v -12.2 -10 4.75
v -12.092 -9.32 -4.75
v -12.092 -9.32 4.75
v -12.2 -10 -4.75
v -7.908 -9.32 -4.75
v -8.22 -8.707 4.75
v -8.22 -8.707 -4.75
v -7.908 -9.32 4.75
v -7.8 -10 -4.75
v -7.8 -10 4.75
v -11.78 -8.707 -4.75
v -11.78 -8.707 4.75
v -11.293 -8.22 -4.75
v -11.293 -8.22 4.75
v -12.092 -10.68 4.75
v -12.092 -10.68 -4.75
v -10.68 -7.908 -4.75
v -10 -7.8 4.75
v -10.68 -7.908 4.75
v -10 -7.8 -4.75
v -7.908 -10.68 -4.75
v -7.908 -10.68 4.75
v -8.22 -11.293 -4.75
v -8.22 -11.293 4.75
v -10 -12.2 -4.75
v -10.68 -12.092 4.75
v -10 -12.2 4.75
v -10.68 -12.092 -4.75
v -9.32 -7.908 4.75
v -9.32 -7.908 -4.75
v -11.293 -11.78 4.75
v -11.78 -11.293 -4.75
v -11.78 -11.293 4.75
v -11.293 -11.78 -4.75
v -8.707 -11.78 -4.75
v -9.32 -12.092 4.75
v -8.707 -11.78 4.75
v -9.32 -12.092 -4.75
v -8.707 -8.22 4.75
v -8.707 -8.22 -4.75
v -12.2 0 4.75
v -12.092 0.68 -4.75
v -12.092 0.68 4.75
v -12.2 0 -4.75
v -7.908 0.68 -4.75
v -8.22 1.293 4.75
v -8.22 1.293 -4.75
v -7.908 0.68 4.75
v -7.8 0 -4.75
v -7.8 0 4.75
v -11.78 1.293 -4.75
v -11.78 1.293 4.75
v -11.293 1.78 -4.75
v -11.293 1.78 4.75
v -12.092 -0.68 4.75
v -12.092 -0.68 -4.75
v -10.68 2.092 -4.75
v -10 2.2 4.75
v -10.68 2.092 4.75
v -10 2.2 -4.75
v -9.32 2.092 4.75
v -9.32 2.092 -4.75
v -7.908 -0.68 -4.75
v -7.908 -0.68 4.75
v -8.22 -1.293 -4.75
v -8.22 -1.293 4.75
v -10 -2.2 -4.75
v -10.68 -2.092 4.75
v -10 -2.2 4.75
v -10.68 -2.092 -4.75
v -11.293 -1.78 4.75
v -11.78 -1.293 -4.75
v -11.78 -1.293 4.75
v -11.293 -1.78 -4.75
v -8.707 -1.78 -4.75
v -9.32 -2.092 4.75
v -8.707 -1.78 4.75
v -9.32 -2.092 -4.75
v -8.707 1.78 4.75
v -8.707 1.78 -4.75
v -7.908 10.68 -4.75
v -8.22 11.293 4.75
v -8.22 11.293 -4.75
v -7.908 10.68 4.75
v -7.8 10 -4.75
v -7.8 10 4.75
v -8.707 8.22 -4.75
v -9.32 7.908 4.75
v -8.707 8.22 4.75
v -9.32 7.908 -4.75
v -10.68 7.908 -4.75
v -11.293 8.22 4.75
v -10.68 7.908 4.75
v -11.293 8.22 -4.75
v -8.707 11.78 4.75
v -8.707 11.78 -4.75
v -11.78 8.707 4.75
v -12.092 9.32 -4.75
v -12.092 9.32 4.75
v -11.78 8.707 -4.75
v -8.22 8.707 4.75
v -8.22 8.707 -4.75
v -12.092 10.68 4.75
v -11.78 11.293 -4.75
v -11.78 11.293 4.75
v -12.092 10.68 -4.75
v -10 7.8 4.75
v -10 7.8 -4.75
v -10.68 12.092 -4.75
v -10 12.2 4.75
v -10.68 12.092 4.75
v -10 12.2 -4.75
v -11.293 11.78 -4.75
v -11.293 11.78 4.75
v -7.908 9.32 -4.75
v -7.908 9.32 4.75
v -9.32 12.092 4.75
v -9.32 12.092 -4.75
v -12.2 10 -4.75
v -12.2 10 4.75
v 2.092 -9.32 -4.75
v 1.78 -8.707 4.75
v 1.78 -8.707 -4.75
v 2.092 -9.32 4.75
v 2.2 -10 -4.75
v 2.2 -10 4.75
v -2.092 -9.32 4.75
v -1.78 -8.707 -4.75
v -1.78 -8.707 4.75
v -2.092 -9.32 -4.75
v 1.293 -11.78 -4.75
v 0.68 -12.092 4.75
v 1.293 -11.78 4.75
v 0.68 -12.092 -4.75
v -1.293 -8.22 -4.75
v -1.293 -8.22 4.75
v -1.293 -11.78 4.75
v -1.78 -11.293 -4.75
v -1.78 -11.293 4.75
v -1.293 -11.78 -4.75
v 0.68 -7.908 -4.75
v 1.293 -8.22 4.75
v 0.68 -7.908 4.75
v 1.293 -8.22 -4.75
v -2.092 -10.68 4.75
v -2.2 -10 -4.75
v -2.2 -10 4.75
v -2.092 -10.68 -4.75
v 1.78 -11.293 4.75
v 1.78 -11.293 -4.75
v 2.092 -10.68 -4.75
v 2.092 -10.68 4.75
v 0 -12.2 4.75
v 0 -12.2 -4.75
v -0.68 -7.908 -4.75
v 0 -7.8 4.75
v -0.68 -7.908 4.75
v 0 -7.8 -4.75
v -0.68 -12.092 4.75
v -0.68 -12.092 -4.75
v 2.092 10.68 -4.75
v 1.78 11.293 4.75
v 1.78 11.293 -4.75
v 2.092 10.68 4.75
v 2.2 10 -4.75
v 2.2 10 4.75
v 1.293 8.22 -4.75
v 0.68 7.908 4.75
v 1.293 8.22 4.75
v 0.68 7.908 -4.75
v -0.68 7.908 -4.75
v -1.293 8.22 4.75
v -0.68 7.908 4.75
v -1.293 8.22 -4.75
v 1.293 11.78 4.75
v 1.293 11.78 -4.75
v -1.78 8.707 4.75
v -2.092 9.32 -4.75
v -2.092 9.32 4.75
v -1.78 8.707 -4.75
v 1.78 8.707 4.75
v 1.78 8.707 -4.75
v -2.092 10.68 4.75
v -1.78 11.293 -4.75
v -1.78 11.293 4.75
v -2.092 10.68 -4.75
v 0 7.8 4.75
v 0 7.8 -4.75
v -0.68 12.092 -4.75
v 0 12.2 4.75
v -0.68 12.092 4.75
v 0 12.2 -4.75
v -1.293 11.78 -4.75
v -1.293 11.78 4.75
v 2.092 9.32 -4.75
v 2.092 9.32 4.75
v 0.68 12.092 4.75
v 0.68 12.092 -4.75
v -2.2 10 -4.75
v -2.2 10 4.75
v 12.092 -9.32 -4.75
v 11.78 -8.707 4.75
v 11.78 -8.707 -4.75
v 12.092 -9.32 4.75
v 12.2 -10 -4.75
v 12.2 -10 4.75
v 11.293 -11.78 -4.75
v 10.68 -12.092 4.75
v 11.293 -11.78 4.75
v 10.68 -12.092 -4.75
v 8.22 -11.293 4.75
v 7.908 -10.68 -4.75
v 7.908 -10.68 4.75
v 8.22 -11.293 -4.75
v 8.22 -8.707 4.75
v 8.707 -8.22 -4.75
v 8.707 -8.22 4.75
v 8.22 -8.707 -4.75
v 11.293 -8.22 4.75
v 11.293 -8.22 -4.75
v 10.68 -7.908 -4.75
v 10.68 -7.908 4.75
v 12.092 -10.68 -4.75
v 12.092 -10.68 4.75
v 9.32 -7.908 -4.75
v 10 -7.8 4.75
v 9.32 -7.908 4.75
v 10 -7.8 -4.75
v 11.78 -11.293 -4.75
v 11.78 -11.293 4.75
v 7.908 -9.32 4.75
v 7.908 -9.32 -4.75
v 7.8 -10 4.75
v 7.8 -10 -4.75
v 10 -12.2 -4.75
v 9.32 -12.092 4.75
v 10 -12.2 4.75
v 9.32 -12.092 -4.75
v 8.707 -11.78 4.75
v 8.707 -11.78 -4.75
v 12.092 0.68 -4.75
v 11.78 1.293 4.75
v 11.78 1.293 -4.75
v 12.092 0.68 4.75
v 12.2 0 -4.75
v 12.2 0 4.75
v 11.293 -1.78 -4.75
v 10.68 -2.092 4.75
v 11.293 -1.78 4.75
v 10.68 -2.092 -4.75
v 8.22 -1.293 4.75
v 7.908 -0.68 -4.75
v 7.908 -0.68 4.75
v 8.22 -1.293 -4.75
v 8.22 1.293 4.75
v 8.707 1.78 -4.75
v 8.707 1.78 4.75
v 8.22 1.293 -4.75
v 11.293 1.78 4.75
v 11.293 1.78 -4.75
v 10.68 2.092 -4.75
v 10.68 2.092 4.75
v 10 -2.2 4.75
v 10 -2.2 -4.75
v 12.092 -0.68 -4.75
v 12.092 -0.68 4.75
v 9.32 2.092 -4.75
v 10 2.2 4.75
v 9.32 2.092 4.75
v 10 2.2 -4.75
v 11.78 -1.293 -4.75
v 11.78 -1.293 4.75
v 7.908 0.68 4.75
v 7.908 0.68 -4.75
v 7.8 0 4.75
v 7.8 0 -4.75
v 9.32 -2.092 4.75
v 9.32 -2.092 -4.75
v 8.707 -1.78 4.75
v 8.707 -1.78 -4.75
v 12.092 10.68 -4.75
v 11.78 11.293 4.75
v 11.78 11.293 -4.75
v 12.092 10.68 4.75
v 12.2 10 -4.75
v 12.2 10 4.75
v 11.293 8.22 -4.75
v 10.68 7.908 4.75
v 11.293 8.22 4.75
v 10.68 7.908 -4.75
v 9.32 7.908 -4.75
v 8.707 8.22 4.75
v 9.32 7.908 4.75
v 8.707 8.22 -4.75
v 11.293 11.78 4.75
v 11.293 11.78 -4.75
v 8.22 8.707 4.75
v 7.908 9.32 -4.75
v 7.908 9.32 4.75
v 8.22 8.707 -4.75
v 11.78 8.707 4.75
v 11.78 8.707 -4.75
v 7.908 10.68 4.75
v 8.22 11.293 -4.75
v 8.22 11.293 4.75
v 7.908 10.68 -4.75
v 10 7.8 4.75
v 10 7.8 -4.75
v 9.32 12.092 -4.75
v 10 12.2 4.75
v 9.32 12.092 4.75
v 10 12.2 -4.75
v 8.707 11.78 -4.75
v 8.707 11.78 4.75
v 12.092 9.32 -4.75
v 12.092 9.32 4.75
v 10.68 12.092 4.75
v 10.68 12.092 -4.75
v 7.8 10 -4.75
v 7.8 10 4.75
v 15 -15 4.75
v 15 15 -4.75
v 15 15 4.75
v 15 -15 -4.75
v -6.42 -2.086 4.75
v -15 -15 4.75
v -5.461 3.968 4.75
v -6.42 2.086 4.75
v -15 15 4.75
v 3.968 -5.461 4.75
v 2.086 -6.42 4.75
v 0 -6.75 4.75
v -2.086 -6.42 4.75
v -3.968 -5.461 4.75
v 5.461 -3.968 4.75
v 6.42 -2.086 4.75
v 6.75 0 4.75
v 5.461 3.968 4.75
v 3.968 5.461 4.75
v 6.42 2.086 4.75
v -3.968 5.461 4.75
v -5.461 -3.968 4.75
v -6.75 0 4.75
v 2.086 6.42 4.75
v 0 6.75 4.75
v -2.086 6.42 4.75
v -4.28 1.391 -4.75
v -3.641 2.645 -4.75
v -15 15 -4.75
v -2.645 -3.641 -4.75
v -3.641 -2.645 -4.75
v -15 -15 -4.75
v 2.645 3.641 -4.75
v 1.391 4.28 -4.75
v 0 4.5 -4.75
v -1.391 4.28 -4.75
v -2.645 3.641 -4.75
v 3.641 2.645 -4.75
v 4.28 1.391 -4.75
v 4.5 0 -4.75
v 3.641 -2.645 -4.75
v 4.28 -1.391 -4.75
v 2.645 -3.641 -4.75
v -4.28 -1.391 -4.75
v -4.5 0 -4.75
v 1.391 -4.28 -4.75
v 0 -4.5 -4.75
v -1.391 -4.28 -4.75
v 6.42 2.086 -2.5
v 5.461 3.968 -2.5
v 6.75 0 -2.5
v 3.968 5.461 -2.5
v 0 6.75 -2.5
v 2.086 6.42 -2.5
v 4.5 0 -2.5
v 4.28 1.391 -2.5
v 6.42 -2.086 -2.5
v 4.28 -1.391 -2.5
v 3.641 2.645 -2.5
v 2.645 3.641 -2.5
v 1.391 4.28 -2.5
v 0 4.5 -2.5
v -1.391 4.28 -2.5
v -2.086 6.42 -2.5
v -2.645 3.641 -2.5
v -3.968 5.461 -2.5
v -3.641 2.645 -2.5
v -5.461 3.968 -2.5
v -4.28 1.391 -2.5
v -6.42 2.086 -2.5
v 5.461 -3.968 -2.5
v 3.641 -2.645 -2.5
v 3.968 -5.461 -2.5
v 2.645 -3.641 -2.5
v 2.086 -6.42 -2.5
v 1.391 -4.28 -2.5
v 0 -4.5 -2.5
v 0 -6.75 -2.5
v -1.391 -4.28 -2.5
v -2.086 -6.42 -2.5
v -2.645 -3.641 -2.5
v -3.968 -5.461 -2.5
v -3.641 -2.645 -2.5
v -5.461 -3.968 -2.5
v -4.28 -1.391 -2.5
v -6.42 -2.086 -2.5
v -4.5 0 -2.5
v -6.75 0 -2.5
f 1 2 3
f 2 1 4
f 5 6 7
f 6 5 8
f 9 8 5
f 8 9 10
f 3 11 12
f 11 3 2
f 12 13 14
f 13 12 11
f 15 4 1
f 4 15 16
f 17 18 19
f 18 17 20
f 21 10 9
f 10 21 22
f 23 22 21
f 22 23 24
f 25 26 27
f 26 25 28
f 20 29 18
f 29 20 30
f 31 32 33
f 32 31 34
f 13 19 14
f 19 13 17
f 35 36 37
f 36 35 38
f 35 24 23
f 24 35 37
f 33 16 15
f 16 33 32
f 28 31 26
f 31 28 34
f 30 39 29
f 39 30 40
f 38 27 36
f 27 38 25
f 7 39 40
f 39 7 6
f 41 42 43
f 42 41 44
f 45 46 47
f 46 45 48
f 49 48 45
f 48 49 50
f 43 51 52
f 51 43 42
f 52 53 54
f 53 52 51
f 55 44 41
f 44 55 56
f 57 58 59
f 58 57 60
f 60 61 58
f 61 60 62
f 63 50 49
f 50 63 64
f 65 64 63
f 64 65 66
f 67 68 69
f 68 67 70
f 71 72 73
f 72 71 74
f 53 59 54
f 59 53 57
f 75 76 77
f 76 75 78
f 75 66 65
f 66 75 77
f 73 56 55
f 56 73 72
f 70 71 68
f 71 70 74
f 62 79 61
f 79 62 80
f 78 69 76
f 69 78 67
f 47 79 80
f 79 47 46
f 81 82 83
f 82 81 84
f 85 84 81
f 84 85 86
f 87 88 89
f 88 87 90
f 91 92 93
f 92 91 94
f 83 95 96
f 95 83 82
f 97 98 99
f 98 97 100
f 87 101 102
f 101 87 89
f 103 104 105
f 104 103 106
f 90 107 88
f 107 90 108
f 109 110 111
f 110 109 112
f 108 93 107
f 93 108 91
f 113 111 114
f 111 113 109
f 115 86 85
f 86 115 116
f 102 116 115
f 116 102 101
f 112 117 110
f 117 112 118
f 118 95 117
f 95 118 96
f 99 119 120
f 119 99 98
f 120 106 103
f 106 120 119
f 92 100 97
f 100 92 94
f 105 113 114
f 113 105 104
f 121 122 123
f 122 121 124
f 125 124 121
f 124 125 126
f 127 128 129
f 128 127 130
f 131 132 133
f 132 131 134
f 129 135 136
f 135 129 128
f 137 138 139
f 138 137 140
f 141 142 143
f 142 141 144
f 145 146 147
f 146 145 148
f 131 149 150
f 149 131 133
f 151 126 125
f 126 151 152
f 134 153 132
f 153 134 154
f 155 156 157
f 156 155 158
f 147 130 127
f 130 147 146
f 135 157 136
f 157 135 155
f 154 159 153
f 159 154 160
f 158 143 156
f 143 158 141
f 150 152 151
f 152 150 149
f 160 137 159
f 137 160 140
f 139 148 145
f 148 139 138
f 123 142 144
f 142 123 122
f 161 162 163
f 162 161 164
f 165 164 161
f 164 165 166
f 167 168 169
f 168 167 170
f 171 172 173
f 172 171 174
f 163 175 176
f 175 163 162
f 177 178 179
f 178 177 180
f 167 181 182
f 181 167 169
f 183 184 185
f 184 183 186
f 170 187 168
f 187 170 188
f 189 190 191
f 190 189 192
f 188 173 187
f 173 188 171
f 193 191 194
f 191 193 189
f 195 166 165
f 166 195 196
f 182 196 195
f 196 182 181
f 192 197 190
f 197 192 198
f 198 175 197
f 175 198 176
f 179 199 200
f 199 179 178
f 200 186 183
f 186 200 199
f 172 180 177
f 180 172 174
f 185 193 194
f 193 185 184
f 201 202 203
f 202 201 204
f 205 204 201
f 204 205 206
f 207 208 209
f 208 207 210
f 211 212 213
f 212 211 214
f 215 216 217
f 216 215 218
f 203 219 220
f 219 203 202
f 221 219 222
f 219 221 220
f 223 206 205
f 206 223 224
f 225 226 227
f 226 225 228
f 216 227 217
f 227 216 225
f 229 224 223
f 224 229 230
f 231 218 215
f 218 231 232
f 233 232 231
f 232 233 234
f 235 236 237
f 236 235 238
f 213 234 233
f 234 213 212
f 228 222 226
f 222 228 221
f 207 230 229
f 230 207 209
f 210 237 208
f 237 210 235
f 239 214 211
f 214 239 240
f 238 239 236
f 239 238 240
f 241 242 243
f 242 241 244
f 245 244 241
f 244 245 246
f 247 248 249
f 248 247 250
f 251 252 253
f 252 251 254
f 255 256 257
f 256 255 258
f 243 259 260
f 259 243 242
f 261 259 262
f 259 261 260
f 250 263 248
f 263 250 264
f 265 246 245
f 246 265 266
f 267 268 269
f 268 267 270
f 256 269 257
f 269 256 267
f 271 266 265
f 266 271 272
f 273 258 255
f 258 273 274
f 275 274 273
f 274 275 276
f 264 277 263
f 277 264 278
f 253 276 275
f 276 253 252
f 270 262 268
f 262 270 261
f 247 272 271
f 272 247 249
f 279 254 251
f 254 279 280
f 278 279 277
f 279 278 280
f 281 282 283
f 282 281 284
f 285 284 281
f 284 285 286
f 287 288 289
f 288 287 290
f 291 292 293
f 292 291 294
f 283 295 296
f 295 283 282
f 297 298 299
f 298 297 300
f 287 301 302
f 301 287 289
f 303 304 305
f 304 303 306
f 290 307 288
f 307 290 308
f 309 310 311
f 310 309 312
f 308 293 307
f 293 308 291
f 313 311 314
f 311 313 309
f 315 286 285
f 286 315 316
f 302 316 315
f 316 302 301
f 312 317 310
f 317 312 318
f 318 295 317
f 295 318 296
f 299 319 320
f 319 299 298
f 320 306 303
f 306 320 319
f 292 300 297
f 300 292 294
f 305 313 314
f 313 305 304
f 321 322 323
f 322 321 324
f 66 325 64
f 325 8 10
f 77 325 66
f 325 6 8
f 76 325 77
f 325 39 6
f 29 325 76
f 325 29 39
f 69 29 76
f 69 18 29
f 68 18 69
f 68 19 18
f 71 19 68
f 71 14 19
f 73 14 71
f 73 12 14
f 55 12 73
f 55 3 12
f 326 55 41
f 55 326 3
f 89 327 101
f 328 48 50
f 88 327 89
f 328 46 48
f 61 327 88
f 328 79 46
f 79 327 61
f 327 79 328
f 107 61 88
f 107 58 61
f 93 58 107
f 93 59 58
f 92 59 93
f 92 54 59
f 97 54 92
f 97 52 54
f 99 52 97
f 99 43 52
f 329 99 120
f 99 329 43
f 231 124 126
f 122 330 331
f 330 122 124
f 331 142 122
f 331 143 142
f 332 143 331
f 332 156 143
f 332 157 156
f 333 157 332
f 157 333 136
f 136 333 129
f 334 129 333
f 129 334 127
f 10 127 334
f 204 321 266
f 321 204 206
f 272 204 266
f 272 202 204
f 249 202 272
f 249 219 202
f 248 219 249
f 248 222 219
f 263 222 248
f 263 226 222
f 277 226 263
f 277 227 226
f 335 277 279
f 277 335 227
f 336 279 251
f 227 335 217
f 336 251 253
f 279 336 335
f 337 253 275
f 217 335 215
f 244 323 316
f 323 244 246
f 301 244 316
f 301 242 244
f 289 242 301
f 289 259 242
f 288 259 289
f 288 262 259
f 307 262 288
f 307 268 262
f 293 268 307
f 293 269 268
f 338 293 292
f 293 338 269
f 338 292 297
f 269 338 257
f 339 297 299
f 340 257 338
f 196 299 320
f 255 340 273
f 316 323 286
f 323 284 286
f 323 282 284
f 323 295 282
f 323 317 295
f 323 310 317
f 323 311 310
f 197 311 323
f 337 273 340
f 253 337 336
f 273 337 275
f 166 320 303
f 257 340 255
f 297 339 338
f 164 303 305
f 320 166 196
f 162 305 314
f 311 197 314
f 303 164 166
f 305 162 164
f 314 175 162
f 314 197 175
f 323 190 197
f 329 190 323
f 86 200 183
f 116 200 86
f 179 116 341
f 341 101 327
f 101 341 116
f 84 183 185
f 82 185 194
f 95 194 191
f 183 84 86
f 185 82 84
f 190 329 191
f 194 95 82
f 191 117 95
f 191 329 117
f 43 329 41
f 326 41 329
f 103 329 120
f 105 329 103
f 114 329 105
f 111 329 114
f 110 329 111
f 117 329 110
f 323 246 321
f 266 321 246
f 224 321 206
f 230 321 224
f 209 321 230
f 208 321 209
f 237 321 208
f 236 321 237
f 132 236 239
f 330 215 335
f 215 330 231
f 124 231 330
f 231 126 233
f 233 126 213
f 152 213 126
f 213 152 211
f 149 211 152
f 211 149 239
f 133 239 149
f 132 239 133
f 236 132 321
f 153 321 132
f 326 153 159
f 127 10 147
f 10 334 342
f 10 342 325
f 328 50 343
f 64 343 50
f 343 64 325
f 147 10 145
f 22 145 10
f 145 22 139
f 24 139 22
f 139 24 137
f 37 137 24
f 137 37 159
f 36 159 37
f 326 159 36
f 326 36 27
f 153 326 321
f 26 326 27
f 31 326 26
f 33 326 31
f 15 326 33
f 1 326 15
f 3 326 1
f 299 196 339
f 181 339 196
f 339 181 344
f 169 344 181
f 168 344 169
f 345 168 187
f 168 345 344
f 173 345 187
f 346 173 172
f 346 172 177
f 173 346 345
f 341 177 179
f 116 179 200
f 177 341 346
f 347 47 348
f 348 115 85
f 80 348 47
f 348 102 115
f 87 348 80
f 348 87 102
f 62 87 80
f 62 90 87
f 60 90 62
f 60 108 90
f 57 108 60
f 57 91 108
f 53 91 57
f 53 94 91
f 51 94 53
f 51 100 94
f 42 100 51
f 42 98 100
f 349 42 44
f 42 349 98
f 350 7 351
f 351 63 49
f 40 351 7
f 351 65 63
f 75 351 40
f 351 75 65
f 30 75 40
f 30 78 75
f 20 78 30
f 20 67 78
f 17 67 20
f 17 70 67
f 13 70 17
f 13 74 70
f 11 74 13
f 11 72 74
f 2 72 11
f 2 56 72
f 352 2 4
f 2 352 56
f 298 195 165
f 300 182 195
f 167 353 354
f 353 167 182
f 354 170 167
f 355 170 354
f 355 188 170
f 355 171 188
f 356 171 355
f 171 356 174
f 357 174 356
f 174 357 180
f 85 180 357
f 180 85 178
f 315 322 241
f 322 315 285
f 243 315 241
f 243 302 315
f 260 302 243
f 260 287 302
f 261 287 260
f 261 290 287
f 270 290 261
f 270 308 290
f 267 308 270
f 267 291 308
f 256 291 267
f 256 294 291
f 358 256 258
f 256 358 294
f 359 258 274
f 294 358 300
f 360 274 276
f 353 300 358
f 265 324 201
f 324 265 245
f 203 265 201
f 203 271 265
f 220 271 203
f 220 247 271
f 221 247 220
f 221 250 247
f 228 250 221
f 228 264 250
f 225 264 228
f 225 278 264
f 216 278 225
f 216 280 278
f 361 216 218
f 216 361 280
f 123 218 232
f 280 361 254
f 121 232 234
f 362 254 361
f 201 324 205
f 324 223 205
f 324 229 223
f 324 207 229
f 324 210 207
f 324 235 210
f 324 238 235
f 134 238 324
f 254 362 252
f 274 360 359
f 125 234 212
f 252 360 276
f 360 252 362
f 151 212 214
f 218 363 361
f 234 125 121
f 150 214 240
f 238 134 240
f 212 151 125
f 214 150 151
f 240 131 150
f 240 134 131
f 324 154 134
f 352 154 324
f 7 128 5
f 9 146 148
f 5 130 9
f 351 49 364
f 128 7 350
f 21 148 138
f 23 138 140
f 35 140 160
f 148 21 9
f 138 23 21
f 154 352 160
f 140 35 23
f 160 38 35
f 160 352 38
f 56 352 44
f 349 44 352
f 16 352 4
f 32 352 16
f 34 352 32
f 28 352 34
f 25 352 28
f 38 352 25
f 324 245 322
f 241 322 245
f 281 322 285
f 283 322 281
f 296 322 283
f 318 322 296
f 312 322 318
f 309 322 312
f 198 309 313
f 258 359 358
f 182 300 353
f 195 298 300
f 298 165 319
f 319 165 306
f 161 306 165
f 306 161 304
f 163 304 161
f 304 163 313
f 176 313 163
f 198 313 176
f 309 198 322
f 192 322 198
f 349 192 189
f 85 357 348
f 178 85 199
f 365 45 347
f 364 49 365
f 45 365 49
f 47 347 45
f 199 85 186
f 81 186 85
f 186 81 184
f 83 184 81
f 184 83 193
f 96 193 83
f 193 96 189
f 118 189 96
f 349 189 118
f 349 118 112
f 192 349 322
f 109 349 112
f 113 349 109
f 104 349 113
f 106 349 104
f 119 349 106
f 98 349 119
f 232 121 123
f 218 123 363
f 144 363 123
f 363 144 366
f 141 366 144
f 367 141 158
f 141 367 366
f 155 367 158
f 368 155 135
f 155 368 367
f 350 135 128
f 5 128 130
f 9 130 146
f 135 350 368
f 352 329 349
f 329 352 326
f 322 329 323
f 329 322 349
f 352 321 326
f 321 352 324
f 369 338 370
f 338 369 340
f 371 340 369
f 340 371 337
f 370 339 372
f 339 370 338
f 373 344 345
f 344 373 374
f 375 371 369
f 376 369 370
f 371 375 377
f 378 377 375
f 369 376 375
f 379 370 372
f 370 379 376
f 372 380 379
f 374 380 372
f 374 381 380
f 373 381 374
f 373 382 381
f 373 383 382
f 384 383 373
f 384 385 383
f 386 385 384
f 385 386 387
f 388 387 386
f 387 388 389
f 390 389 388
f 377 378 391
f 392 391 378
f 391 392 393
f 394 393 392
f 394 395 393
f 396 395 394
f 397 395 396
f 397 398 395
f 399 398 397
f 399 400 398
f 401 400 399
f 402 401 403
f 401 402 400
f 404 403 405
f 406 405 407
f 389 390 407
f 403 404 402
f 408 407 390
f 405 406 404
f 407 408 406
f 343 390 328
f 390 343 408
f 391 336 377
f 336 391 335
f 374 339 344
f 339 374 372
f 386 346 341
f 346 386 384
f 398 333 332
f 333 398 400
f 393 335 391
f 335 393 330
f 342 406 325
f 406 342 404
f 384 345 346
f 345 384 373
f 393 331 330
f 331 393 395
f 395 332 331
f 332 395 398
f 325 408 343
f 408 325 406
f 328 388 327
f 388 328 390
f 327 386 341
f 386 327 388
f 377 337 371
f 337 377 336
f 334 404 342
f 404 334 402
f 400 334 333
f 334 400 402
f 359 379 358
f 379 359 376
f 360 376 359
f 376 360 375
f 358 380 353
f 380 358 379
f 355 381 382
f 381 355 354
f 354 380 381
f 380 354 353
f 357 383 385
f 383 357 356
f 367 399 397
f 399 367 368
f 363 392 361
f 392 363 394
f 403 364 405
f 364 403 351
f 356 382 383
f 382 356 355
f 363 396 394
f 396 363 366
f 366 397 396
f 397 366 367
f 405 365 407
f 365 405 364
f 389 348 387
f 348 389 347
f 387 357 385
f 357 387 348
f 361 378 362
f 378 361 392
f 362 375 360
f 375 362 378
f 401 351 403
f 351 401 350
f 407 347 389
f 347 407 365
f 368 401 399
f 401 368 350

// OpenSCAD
// holder for M4 bearing with 3x3 plate
$fn = 20;
d_o = 13.5;
d_o1 = 9;
r_ho = 2.2;

z_b = 8;
z_1 = 1.5;
z_a = z_b + z_1;

x_1 = 30;

y_1 = 30;

step_xy = 10;

module m_hole( i, j )
{
  translate([ i*step_xy, j*step_xy,z_1])  cylinder(h=2*z_a, r = r_ho, center = true );
}

module bearing_box()
{
  difference() {
    cube([x_1,y_1,z_a], true );
    translate([0,0,z_1])
      cylinder(h=z_b, r = d_o/2.0, center = true );
    translate([0,0,z_1])
      cylinder(h=2*z_a, r = d_o1/2.0, center = true );

    for( i=[-1:1:1]) {
      for( j=[-1:1:1]) {
        m_hole( i, j );
      }
    };
  }
}

bearing_box();
